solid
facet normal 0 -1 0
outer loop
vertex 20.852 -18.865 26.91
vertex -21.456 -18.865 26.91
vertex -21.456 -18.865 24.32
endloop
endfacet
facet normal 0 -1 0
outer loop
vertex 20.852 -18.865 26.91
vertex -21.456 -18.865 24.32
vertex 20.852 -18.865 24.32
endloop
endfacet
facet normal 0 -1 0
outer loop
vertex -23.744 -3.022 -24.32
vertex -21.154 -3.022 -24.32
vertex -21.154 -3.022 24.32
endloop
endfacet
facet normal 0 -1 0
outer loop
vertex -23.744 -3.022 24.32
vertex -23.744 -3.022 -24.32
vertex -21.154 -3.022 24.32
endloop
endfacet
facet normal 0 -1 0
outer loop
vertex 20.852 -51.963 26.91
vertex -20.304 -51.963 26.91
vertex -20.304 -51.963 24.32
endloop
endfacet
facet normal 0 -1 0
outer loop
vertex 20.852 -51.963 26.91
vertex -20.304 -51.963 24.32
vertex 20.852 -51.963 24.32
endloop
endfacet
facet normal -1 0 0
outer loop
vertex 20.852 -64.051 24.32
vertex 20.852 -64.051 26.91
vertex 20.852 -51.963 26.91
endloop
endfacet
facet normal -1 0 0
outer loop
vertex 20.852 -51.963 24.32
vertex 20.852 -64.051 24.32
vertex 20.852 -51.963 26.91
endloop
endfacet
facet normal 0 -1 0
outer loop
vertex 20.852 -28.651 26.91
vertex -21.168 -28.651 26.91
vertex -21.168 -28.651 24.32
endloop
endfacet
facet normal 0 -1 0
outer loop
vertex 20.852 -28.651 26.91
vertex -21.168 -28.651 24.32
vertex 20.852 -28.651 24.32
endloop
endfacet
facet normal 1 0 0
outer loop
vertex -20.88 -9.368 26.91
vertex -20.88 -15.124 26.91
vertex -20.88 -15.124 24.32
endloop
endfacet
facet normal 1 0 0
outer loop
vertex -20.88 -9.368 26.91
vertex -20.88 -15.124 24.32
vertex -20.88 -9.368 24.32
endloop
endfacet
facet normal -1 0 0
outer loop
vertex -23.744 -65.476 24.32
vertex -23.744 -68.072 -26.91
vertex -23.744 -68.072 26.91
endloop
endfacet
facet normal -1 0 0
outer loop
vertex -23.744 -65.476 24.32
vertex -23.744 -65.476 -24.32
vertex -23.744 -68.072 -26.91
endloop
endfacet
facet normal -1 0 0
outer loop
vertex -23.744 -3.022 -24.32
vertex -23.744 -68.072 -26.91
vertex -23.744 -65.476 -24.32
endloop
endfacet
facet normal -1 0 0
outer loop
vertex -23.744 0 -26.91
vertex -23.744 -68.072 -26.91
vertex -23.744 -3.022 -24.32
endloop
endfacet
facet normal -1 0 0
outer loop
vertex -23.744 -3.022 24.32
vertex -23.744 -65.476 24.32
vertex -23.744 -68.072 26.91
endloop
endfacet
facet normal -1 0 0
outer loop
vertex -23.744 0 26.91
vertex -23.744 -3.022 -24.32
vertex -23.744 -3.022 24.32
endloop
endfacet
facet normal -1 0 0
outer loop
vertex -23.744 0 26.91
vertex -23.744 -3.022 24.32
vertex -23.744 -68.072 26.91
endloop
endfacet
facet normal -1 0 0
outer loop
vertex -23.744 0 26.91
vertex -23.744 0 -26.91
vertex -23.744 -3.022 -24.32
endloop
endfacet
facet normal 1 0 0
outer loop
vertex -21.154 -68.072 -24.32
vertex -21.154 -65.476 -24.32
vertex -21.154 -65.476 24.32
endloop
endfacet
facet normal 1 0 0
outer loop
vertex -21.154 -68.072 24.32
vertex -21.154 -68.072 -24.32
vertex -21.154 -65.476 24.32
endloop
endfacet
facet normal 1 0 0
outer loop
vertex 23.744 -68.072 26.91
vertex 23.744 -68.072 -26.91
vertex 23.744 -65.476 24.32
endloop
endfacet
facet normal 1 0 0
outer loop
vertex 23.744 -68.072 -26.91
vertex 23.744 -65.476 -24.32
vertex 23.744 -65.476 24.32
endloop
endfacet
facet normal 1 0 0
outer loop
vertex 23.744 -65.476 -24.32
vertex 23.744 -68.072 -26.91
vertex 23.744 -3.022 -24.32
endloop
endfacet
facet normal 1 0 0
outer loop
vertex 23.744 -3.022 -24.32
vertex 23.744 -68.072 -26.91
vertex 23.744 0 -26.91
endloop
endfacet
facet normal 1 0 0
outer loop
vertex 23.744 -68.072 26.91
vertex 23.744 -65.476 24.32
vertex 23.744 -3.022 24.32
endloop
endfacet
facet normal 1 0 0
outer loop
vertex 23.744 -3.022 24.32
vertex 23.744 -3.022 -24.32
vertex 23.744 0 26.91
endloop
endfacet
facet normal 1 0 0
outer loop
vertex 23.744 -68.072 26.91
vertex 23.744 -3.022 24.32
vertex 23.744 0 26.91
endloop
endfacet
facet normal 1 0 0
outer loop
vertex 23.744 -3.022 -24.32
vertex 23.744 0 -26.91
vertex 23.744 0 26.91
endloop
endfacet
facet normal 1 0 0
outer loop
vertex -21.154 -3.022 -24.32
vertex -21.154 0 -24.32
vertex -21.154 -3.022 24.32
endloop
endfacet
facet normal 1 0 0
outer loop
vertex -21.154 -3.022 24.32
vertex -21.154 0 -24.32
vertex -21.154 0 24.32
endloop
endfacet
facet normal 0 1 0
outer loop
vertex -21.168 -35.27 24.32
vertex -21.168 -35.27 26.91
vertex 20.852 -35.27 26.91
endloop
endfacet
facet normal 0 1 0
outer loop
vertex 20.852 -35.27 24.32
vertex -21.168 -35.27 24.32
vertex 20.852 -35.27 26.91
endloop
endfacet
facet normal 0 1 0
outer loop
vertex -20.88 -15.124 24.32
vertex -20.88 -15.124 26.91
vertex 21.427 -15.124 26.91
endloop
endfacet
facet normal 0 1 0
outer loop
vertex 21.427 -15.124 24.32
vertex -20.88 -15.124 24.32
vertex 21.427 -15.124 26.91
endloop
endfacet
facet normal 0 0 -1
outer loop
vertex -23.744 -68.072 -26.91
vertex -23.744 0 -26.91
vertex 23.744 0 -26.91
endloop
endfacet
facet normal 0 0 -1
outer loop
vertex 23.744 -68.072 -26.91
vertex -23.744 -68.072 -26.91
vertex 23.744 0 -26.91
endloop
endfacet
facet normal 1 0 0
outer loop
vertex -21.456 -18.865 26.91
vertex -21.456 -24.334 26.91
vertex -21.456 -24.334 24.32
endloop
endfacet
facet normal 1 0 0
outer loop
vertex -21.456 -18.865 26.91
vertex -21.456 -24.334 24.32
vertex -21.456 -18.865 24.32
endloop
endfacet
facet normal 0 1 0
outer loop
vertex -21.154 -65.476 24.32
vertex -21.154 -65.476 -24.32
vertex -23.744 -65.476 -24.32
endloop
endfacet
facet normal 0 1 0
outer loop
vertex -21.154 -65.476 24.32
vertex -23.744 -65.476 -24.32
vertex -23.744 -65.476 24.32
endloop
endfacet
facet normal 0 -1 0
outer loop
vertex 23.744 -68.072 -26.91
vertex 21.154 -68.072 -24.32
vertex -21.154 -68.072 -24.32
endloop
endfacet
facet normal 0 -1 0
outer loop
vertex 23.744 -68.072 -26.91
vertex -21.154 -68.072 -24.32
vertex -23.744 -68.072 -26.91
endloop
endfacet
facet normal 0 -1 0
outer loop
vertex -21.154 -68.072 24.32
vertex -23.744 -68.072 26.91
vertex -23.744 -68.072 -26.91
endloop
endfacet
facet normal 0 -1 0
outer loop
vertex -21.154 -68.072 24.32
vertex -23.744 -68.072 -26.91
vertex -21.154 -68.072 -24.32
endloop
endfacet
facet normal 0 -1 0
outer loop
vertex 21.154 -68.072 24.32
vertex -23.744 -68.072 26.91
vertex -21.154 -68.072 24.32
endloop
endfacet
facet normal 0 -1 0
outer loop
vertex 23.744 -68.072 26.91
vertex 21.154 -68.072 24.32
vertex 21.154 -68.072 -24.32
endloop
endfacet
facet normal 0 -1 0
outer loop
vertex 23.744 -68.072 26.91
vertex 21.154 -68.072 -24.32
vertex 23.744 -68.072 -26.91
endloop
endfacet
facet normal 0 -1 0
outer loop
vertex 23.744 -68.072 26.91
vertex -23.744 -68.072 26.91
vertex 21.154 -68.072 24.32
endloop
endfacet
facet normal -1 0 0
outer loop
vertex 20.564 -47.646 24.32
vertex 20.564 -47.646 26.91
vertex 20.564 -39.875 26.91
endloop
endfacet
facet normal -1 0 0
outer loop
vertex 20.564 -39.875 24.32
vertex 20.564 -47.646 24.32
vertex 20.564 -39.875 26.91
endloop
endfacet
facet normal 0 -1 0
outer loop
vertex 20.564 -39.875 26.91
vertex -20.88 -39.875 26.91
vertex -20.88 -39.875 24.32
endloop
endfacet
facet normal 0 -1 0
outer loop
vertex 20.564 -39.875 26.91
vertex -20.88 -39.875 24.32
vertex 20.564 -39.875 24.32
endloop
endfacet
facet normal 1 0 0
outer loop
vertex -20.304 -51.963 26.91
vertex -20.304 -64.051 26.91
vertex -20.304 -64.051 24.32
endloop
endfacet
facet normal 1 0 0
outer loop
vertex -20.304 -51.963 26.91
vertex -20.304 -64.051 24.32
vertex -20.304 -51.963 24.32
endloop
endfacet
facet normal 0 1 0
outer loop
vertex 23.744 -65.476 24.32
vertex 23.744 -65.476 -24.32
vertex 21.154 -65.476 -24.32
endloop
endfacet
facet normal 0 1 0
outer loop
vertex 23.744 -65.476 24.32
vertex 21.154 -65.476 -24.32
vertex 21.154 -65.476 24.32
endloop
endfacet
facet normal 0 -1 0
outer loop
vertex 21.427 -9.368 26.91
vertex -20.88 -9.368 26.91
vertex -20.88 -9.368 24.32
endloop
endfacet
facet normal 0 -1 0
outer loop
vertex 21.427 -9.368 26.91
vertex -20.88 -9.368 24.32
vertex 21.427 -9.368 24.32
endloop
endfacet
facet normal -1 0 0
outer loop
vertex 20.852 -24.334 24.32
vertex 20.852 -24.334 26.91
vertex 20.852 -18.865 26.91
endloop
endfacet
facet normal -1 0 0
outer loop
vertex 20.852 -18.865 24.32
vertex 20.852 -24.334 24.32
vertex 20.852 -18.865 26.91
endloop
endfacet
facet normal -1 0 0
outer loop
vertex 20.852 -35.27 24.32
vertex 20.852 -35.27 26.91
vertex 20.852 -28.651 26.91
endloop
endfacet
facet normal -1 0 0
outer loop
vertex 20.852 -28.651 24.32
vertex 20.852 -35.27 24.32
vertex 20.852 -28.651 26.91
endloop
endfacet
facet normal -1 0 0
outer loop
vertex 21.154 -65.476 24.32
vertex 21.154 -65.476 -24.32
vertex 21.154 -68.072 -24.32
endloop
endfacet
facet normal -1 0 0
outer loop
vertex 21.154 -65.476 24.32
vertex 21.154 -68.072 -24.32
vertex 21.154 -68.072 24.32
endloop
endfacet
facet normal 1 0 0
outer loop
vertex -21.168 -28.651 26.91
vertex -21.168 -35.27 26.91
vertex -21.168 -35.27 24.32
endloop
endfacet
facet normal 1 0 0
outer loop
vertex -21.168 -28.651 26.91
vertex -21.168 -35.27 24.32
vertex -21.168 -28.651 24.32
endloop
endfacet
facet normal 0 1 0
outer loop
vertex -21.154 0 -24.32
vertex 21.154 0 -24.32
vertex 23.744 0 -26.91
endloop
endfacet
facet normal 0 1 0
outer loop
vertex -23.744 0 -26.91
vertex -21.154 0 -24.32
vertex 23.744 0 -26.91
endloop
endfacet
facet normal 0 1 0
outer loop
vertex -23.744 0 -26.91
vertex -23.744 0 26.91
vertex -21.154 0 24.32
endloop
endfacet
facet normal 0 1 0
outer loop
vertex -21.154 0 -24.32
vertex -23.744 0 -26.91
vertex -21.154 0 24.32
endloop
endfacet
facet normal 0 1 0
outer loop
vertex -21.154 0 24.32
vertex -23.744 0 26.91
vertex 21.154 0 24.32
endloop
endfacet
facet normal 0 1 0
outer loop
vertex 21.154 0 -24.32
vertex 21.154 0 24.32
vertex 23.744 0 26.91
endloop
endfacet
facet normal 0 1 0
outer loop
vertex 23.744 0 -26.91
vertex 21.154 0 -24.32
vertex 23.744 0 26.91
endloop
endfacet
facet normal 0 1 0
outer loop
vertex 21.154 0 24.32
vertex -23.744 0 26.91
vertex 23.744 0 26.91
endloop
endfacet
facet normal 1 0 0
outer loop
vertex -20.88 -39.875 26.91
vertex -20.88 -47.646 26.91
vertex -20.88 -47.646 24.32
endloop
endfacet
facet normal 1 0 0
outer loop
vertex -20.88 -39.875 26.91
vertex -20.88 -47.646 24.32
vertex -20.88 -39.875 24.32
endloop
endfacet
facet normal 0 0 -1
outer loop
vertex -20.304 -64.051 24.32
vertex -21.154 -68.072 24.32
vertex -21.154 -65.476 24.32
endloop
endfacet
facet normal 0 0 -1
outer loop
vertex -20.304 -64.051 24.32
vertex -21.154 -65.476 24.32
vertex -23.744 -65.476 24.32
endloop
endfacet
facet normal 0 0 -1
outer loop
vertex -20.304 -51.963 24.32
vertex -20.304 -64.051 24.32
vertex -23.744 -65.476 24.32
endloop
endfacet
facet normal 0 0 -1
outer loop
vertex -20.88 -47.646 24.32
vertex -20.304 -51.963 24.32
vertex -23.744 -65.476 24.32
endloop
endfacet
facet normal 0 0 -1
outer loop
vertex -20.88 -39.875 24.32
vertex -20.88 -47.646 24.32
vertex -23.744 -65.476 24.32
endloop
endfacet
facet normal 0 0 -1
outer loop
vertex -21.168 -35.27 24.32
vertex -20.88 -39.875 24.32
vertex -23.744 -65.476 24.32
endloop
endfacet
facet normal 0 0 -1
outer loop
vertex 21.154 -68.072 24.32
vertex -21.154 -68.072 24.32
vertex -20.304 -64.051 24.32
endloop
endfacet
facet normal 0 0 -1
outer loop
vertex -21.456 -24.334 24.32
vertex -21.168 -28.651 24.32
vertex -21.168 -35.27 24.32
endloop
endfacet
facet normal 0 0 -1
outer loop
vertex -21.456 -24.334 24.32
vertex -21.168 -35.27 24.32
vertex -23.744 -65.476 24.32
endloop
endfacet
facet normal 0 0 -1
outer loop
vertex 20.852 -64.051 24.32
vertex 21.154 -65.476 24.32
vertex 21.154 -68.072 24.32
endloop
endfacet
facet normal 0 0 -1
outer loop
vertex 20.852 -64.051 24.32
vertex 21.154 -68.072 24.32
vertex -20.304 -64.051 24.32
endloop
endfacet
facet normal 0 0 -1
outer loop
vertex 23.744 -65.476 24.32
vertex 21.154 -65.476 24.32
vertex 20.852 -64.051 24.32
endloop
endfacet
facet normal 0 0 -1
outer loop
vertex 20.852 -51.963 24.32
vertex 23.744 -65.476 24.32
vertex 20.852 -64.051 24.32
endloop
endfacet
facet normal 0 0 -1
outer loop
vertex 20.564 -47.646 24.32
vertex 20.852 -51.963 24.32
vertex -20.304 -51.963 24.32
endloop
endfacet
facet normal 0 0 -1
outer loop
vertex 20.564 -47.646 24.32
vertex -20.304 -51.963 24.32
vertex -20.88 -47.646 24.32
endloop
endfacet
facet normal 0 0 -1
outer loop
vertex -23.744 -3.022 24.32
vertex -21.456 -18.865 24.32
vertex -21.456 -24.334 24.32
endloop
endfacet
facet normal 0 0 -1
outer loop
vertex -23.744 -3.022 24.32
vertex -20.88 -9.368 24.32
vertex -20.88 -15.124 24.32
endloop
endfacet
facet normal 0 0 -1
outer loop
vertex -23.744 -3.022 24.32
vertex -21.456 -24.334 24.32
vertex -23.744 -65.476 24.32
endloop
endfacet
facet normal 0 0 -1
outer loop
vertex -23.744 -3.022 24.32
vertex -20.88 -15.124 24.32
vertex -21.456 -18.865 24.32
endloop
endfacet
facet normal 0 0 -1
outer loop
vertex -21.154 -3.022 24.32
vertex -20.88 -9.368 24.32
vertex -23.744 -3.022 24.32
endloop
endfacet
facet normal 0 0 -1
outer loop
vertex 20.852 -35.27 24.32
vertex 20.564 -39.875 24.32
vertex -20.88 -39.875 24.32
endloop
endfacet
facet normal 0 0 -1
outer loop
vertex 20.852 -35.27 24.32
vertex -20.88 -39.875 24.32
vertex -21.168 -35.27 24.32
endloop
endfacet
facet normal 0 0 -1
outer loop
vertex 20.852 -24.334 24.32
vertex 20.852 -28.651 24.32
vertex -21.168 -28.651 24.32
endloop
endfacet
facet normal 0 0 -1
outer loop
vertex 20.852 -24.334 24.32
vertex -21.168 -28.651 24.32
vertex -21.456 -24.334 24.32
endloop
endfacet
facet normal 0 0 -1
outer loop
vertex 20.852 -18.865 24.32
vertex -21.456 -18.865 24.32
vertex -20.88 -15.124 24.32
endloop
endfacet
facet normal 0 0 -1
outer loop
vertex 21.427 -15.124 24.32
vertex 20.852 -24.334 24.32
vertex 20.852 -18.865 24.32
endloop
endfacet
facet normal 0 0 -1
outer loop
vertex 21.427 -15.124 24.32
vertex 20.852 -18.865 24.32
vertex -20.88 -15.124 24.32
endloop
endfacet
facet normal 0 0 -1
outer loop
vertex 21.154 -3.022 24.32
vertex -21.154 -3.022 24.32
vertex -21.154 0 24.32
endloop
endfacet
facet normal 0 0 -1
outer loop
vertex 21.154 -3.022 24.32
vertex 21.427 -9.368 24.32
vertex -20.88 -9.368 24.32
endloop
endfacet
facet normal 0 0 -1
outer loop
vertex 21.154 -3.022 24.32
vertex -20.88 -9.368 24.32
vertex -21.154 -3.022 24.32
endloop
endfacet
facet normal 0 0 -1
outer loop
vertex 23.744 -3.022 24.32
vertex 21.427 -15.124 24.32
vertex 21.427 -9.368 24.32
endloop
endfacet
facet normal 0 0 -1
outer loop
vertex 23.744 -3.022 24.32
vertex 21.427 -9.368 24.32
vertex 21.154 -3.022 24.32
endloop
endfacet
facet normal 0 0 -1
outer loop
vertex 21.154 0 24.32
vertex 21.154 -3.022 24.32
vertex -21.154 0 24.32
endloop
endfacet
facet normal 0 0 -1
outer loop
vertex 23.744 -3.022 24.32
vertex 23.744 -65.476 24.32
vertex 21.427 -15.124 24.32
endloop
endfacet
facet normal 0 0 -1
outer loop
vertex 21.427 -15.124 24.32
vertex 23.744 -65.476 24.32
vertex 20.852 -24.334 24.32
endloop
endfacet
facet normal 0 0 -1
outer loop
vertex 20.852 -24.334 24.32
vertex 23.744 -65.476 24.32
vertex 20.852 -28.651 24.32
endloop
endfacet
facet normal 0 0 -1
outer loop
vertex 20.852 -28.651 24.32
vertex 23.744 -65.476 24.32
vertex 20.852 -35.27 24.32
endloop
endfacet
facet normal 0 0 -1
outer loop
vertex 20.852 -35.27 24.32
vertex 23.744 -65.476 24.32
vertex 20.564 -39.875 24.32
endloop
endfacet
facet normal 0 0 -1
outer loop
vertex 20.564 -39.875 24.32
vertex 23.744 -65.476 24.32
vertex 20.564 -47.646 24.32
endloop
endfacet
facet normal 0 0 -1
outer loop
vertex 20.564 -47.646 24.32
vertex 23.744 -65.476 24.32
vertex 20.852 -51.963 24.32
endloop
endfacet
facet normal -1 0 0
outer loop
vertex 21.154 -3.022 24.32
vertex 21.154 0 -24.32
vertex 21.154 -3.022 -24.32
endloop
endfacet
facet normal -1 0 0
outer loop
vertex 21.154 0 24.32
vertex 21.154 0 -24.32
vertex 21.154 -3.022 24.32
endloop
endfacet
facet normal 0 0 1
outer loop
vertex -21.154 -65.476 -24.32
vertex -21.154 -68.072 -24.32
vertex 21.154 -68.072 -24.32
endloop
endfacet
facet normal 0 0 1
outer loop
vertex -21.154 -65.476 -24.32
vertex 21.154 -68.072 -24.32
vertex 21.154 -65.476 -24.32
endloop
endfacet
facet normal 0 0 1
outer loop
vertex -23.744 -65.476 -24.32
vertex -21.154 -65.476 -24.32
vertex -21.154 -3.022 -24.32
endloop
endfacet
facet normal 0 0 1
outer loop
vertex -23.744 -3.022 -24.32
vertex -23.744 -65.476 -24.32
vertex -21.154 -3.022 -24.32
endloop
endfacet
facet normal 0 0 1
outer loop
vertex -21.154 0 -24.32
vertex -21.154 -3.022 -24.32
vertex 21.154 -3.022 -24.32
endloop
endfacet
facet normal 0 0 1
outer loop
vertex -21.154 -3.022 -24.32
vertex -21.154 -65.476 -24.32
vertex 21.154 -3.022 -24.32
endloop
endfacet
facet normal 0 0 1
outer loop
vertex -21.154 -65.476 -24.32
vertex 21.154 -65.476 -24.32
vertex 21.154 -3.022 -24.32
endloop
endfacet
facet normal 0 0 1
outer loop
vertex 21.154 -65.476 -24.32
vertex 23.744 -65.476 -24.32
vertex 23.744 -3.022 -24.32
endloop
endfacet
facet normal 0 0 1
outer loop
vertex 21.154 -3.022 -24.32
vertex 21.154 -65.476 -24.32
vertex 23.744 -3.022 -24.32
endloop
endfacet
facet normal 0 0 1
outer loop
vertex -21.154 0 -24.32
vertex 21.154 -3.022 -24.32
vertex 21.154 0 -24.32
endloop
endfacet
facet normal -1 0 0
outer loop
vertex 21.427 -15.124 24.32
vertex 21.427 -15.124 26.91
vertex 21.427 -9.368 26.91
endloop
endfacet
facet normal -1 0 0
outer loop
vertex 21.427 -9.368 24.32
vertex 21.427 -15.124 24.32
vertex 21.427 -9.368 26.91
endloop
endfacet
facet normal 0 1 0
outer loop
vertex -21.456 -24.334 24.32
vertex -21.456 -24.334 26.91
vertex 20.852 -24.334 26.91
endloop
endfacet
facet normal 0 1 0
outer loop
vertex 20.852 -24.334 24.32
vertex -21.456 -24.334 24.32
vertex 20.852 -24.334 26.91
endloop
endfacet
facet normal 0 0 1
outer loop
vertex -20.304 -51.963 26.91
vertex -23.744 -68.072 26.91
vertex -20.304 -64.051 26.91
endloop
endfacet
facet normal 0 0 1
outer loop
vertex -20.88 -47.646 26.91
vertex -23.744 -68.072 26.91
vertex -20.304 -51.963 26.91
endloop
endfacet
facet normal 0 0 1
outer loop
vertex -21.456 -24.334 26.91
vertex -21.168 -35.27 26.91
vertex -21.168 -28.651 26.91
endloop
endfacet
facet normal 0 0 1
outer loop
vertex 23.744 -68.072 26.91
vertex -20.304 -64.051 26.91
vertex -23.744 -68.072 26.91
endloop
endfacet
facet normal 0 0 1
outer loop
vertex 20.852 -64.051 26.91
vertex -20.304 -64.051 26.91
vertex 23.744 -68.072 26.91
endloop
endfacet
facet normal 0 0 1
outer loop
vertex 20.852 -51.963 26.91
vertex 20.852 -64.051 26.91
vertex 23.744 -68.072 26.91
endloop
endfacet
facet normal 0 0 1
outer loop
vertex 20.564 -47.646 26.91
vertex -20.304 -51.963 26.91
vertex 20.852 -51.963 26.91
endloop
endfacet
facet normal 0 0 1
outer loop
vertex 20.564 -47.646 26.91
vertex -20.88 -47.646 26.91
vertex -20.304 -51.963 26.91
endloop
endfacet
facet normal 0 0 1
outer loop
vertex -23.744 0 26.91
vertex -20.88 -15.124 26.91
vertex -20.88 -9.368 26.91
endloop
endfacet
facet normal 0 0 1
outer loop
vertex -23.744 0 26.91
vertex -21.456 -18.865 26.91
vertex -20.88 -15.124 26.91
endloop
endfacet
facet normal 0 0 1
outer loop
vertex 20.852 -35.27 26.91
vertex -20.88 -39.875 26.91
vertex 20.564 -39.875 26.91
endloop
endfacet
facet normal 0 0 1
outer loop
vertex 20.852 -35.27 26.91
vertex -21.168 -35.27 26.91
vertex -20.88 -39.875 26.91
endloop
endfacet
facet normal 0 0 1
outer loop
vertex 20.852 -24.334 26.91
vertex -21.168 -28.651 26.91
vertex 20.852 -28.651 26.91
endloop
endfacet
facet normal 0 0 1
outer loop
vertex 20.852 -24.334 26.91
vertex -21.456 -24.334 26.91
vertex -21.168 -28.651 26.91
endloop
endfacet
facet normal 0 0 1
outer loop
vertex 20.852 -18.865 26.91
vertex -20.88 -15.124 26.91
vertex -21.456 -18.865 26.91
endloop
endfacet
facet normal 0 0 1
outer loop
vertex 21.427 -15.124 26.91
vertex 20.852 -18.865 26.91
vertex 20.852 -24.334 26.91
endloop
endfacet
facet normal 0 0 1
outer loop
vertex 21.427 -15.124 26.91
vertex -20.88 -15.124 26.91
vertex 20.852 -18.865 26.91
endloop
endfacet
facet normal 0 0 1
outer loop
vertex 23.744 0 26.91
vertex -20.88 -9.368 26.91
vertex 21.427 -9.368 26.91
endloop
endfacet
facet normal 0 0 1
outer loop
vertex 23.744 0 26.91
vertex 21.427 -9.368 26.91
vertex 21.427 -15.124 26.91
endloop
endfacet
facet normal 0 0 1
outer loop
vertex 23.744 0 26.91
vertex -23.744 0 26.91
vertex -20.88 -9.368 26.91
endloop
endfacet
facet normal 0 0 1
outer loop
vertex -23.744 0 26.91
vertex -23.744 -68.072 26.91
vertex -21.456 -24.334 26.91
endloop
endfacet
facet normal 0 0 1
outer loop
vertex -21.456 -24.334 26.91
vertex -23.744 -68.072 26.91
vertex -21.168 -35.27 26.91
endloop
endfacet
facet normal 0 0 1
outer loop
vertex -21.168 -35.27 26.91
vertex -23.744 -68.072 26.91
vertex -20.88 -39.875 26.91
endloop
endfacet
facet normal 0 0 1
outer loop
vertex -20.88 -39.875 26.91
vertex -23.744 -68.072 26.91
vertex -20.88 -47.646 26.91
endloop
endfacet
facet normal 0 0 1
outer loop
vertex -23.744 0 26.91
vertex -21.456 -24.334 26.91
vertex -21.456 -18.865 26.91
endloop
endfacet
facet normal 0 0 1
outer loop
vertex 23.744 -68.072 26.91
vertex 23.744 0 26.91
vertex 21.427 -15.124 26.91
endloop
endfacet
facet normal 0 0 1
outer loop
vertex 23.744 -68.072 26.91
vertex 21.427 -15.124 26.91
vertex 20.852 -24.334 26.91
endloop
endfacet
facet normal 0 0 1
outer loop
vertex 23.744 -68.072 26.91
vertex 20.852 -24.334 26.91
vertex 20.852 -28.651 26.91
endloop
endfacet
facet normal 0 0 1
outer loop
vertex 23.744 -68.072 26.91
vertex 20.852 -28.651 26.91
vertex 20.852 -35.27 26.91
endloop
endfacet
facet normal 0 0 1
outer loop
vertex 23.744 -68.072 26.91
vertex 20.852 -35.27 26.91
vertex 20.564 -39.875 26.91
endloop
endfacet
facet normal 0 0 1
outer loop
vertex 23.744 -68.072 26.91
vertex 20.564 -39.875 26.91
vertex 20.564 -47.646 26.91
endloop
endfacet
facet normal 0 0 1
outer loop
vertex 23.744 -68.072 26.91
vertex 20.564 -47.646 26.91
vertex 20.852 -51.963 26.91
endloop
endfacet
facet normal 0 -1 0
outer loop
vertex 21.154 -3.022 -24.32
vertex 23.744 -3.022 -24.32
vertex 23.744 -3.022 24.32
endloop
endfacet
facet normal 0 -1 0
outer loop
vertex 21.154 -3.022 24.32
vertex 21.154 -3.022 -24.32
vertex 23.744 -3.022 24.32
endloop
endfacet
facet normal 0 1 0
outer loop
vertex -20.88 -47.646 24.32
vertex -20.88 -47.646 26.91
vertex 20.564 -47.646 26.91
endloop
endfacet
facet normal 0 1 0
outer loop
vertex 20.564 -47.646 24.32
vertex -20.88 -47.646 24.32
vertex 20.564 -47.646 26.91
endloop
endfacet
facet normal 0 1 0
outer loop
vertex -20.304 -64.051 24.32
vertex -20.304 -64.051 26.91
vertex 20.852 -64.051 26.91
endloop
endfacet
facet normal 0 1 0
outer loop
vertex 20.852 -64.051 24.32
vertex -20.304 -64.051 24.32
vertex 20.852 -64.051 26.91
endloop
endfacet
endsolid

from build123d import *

# Parameters (mm, degrees)
F0_W     = 47.487952
F0_H     = 53.819674
F0_W_2   = 42.307448
F0_H_2   = 48.639174
F1_DEPTH = 68.072
F2_W     = 62.453845
F2_H     = 48.639174
F3_DEPTH = 68.072
F4_W     = 41.156224
F4_H     = 12.087841
F4_W_2   = 41.44403
F4_H_2   = 7.770758
F4_W_3   = 42.01964
F4_H_3   = 6.619532
F4_W_4   = 42.307448
F4_H_4   = 5.468311
F4_W_5   = 42.307446
F4_H_5   = 5.756115
F5_DEPTH = 25.4


with BuildPart() as f1:
    # F0 (on Front) → F1 (new body)
    with BuildSketch(Plane.XZ):
        Rectangle(F0_W, F0_H)
        Rectangle(F0_W_2, F0_H_2, mode=Mode.SUBTRACT)
    extrude(amount=F1_DEPTH)

    # F2 (on face) → F3 (cut)
    with BuildSketch(Plane.YZ.offset(23.743976)):
        with Locations((-34.248885, 0)):
            Rectangle(F2_W, F2_H)
    extrude(amount=-F3_DEPTH, mode=Mode.SUBTRACT)

    # F4 (on face) → F5 (cut)
    with BuildSketch(Plane.XY.offset(26.909837)):
        with Locations((0.273644, -58.007023)):
            Rectangle(F4_W, F4_H)
        with Locations((-0.158064, -43.760637)):
            Rectangle(F4_W_2, F4_H_2)
        with Locations((-0.158064, -31.960601)):
            Rectangle(F4_W_3, F4_H_3)
        with Locations((-0.301968, -21.599593)):
            Rectangle(F4_W_4, F4_H_4)
        with Locations((0.273644, -12.245907)):
            Rectangle(F4_W_5, F4_H_5)
    extrude(amount=-F5_DEPTH, mode=Mode.SUBTRACT)


solid = f1.part
